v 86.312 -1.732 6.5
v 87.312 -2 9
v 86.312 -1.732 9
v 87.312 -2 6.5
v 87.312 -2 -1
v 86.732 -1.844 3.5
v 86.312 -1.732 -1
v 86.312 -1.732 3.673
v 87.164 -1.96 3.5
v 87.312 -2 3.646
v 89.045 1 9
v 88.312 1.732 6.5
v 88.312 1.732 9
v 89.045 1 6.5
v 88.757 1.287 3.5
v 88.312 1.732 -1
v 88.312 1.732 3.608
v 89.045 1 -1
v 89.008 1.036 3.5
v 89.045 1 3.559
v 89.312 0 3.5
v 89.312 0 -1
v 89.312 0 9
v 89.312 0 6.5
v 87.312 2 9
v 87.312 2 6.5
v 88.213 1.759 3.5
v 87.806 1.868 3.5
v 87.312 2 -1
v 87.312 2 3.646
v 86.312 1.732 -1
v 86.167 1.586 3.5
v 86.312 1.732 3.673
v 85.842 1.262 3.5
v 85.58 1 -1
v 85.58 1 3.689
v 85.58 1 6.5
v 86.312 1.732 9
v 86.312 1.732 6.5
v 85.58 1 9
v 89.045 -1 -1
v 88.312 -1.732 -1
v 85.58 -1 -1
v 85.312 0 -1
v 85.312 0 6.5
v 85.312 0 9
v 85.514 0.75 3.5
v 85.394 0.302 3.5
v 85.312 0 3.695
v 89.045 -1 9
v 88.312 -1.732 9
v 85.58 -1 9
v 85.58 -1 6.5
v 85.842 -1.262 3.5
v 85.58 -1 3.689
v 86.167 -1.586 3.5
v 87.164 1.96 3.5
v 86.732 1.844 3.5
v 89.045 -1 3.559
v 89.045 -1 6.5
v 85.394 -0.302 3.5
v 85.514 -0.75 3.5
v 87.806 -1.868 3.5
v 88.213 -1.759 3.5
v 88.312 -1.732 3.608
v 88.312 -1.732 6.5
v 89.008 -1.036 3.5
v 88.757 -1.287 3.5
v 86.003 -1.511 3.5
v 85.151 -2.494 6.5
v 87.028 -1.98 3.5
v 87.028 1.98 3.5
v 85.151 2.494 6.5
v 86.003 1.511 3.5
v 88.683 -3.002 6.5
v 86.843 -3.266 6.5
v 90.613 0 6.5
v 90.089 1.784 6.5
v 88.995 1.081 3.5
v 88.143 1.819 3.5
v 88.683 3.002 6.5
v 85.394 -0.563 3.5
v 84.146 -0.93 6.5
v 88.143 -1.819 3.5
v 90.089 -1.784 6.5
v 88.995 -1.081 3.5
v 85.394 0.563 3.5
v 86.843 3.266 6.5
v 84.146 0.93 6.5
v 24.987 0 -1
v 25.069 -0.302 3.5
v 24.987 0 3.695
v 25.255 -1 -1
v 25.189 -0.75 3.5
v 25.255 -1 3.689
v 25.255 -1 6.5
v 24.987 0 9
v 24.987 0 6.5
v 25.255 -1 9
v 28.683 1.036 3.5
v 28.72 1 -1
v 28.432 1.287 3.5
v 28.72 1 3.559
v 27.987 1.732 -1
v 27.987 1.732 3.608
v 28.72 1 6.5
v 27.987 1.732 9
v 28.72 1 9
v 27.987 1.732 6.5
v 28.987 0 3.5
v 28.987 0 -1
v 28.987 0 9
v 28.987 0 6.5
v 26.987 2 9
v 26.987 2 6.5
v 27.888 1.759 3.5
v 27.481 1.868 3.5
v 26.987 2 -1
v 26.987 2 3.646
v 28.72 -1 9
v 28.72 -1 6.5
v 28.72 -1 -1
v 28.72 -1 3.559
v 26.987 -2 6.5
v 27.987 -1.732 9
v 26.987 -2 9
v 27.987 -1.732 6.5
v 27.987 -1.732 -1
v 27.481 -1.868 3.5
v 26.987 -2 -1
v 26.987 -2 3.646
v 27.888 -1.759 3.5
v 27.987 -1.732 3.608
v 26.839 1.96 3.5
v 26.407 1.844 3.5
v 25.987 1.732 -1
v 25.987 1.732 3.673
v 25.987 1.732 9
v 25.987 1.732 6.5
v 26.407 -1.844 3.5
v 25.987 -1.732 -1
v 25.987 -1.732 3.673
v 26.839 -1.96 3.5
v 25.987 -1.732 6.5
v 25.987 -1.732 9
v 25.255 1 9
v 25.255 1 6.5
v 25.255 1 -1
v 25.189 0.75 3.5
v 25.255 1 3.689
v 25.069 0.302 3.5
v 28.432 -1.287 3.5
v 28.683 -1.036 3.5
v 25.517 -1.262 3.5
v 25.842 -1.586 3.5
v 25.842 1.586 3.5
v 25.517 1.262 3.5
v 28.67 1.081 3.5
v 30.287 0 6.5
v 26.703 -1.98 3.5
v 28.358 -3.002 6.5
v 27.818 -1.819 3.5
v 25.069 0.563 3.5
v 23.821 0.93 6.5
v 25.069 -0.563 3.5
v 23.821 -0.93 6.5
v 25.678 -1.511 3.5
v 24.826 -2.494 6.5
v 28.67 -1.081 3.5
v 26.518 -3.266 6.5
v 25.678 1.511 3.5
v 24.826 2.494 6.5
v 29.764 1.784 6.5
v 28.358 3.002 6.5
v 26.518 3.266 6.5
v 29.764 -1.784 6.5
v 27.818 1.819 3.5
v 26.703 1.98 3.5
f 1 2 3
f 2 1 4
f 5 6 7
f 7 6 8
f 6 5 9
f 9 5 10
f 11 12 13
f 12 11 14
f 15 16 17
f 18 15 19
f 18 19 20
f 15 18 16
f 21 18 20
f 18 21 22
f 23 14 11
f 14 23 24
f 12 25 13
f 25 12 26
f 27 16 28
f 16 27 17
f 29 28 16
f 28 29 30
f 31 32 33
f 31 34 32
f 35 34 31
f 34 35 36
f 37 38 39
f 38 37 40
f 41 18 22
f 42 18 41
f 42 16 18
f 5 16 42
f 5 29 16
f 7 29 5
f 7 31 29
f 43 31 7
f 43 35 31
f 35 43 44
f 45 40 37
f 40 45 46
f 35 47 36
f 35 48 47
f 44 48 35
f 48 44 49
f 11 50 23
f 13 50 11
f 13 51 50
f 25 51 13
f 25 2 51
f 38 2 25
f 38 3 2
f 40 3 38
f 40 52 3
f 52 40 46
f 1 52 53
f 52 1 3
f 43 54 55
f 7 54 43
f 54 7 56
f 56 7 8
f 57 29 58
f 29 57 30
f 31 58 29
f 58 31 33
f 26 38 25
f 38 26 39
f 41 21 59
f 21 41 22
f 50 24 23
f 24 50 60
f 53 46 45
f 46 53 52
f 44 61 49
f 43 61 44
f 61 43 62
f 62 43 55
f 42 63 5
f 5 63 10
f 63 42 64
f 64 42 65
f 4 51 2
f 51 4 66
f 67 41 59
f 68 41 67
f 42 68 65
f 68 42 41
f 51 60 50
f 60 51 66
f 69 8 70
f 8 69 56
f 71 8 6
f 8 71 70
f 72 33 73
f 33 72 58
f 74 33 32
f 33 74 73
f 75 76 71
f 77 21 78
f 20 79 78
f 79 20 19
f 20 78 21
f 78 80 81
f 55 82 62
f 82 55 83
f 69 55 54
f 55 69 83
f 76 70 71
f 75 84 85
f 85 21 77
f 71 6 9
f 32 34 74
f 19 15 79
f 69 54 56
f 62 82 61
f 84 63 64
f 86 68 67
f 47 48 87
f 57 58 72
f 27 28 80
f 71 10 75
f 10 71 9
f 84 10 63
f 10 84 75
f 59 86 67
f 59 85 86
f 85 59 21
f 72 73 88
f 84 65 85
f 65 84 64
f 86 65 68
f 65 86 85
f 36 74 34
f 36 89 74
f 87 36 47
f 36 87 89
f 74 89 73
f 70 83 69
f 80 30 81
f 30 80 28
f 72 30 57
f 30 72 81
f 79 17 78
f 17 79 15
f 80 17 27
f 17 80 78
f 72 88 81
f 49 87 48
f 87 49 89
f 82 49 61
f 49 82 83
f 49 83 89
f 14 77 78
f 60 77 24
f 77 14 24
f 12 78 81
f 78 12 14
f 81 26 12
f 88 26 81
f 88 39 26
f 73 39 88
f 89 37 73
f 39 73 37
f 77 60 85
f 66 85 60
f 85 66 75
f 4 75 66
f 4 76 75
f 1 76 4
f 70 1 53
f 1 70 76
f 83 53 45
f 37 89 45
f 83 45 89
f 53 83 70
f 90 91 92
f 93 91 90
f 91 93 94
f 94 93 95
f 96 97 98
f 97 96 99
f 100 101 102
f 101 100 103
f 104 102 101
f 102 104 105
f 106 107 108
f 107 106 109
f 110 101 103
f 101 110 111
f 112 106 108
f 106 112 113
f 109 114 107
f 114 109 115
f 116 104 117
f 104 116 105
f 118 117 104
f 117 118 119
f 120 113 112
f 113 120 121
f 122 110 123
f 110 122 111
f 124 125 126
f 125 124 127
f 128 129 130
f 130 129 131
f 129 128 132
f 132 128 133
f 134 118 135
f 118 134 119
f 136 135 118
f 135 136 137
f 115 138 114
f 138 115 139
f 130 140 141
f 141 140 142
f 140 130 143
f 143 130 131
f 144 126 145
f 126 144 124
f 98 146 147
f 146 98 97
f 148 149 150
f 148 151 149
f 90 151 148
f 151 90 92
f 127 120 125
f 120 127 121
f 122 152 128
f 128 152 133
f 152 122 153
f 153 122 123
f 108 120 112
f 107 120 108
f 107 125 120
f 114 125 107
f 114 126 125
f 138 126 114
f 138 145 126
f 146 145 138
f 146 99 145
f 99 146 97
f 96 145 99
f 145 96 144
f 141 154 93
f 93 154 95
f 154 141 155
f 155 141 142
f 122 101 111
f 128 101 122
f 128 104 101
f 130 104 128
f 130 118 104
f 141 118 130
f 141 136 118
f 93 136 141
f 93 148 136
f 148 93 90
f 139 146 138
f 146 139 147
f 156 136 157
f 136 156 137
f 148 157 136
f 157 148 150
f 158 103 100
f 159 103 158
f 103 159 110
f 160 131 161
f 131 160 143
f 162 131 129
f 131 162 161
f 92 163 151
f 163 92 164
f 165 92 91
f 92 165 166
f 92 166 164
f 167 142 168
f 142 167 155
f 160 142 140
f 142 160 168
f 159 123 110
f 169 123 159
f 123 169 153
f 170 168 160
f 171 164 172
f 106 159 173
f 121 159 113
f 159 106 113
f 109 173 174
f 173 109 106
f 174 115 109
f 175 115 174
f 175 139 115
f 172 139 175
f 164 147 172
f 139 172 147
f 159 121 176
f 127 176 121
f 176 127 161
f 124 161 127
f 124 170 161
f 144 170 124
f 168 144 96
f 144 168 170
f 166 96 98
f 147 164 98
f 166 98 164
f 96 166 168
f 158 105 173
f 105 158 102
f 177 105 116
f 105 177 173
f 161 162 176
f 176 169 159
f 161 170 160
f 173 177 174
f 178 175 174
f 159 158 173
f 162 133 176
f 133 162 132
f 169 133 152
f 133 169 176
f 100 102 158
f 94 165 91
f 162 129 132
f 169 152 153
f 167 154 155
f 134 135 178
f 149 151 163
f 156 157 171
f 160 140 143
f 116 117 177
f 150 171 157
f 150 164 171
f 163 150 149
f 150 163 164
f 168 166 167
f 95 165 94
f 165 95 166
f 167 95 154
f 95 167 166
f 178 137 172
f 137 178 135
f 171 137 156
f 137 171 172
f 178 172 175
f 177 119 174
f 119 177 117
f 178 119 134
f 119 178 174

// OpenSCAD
// file: ../lam.scad
// Bigger hole in your wall? Try this
plate_size = 0; // [0:Standard, 1:Junior-Jumbo, 2:Jumbo]

height_sizes = [114.3,123.825,133.35];

// Toggle screw holes
module toggle_screws(height_sizes = [114.3], 
                     plate_size = 0)
{
	 translate([height_sizes[plate_size]/2 + 30.1625,0,-1]) 
     cylinder(r=2, h=10, $fn=12);

	 translate([height_sizes[plate_size]/2 + 30.1625,0,3.5]) 
     cylinder(r1=2, r2=3.3, h=3);
	 
     // other part
	 translate([height_sizes[plate_size]/2 - 30.1625,0,-1]) cylinder(r=2, h=10, $fn=12);
	 translate([height_sizes[plate_size]/2 - 30.1625,0,3.5]) cylinder(r1=2, r2=3.3, h=3);
}
// main file
use <../lam.scad>

include <../lam.scad>

toggle_screws();
